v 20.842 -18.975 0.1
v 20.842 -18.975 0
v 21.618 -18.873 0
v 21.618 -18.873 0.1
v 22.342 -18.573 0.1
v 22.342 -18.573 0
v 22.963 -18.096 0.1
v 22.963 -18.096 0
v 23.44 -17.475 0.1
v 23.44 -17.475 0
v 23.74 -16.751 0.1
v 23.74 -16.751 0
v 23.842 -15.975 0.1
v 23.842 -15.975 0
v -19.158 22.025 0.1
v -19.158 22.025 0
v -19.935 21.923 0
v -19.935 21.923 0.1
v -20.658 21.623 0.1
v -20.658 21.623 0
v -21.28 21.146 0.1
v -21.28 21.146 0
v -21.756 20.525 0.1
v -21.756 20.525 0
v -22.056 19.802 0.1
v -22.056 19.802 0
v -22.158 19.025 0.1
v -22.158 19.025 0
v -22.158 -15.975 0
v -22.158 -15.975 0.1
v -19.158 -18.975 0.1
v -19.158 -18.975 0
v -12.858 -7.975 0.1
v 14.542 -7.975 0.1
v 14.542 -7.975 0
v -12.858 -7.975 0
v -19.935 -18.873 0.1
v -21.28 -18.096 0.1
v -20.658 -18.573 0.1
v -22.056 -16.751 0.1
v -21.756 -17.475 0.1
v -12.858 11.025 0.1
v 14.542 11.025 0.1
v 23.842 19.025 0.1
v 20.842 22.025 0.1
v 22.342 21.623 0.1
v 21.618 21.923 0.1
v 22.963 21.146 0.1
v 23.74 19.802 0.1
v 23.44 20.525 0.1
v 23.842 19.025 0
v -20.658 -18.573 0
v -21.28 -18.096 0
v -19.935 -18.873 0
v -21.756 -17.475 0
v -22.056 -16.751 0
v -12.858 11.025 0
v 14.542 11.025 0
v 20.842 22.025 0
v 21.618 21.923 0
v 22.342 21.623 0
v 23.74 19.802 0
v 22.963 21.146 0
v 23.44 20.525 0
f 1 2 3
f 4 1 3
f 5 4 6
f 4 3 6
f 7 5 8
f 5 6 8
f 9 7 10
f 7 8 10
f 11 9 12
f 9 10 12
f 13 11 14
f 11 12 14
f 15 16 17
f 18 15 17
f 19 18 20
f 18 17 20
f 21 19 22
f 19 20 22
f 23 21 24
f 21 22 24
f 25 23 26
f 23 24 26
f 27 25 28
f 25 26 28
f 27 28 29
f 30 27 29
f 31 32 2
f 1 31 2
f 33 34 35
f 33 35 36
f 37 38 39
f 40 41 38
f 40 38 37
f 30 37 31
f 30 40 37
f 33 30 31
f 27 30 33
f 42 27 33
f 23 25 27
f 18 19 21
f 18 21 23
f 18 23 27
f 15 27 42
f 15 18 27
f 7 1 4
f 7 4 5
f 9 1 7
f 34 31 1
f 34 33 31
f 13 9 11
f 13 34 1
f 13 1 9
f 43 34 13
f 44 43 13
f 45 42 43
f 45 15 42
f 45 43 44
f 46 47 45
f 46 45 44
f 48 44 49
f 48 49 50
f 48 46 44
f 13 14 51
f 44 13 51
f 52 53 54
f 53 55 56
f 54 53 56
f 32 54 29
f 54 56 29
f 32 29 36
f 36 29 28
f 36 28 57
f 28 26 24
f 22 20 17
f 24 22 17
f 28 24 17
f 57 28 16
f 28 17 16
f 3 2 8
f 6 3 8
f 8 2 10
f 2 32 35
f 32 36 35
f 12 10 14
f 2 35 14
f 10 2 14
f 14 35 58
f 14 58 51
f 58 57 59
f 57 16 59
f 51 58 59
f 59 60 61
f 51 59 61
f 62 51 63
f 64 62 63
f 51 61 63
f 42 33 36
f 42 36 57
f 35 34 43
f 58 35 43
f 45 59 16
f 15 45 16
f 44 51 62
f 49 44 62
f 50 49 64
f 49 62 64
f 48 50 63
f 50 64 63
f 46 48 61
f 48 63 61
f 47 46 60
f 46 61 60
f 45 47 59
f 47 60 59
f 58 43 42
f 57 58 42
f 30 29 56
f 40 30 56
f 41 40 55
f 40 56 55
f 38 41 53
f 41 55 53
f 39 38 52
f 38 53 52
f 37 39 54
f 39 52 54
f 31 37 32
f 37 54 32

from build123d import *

# Parameters (mm, degrees)
RESSALTO_EXTRUS_O1_DEPTH   = 0.1
CORTE_EXTRUS_O1_DEPTH      = 33.458434448
CORTE_EXTRUS_O1_DEPTH_BACK = 33.458434448
ESBO_O2_W                  = 27.4
ESBO_O2_H                  = 19


with BuildPart() as part:
    # Esboço1 → Ressalto-extrusão1 (new body)
    with BuildSketch(Plane.XY):
        with BuildLine():
            Line((-22.158193819, 19.025172981), (-22.158193819, -15.974827019))
            ThreePointArc((-22.158193819, -15.974827019), (-21.279514162, -18.096147362), (-19.158193819, -18.974827019))
            Line((-19.158193819, -18.974827019), (20.841806181, -18.974827019))
            ThreePointArc((20.841806181, -18.974827019), (22.963126525, -18.096147362), (23.841806181, -15.974827019))
            Line((23.841806181, -15.974827019), (23.841806181, 19.025172981))
            ThreePointArc((23.841806181, 19.025172981), (22.963126525, 21.146493325), (20.841806181, 22.025172981))
            Line((20.841806181, 22.025172981), (-19.158193819, 22.025172981))
            ThreePointArc((-19.158193819, 22.025172981), (-21.279514162, 21.146493325), (-22.158193819, 19.025172981))
        make_face()
    extrude(amount=RESSALTO_EXTRUS_O1_DEPTH)

    # Esboço2 → Corte-extrusão1 (cut, two sides: drawn at the far end of the back side and taken through both)
    with BuildSketch(Plane(origin=(0, 0, 0), x_dir=(-1, 0, 0), z_dir=(0, 0, -1)).offset(-CORTE_EXTRUS_O1_DEPTH_BACK)):
        with Locations((-0.841806181, 1.525172981)):
            Rectangle(ESBO_O2_W, ESBO_O2_H)
    extrude(amount=CORTE_EXTRUS_O1_DEPTH + CORTE_EXTRUS_O1_DEPTH_BACK, mode=Mode.SUBTRACT)


solid = part.part
